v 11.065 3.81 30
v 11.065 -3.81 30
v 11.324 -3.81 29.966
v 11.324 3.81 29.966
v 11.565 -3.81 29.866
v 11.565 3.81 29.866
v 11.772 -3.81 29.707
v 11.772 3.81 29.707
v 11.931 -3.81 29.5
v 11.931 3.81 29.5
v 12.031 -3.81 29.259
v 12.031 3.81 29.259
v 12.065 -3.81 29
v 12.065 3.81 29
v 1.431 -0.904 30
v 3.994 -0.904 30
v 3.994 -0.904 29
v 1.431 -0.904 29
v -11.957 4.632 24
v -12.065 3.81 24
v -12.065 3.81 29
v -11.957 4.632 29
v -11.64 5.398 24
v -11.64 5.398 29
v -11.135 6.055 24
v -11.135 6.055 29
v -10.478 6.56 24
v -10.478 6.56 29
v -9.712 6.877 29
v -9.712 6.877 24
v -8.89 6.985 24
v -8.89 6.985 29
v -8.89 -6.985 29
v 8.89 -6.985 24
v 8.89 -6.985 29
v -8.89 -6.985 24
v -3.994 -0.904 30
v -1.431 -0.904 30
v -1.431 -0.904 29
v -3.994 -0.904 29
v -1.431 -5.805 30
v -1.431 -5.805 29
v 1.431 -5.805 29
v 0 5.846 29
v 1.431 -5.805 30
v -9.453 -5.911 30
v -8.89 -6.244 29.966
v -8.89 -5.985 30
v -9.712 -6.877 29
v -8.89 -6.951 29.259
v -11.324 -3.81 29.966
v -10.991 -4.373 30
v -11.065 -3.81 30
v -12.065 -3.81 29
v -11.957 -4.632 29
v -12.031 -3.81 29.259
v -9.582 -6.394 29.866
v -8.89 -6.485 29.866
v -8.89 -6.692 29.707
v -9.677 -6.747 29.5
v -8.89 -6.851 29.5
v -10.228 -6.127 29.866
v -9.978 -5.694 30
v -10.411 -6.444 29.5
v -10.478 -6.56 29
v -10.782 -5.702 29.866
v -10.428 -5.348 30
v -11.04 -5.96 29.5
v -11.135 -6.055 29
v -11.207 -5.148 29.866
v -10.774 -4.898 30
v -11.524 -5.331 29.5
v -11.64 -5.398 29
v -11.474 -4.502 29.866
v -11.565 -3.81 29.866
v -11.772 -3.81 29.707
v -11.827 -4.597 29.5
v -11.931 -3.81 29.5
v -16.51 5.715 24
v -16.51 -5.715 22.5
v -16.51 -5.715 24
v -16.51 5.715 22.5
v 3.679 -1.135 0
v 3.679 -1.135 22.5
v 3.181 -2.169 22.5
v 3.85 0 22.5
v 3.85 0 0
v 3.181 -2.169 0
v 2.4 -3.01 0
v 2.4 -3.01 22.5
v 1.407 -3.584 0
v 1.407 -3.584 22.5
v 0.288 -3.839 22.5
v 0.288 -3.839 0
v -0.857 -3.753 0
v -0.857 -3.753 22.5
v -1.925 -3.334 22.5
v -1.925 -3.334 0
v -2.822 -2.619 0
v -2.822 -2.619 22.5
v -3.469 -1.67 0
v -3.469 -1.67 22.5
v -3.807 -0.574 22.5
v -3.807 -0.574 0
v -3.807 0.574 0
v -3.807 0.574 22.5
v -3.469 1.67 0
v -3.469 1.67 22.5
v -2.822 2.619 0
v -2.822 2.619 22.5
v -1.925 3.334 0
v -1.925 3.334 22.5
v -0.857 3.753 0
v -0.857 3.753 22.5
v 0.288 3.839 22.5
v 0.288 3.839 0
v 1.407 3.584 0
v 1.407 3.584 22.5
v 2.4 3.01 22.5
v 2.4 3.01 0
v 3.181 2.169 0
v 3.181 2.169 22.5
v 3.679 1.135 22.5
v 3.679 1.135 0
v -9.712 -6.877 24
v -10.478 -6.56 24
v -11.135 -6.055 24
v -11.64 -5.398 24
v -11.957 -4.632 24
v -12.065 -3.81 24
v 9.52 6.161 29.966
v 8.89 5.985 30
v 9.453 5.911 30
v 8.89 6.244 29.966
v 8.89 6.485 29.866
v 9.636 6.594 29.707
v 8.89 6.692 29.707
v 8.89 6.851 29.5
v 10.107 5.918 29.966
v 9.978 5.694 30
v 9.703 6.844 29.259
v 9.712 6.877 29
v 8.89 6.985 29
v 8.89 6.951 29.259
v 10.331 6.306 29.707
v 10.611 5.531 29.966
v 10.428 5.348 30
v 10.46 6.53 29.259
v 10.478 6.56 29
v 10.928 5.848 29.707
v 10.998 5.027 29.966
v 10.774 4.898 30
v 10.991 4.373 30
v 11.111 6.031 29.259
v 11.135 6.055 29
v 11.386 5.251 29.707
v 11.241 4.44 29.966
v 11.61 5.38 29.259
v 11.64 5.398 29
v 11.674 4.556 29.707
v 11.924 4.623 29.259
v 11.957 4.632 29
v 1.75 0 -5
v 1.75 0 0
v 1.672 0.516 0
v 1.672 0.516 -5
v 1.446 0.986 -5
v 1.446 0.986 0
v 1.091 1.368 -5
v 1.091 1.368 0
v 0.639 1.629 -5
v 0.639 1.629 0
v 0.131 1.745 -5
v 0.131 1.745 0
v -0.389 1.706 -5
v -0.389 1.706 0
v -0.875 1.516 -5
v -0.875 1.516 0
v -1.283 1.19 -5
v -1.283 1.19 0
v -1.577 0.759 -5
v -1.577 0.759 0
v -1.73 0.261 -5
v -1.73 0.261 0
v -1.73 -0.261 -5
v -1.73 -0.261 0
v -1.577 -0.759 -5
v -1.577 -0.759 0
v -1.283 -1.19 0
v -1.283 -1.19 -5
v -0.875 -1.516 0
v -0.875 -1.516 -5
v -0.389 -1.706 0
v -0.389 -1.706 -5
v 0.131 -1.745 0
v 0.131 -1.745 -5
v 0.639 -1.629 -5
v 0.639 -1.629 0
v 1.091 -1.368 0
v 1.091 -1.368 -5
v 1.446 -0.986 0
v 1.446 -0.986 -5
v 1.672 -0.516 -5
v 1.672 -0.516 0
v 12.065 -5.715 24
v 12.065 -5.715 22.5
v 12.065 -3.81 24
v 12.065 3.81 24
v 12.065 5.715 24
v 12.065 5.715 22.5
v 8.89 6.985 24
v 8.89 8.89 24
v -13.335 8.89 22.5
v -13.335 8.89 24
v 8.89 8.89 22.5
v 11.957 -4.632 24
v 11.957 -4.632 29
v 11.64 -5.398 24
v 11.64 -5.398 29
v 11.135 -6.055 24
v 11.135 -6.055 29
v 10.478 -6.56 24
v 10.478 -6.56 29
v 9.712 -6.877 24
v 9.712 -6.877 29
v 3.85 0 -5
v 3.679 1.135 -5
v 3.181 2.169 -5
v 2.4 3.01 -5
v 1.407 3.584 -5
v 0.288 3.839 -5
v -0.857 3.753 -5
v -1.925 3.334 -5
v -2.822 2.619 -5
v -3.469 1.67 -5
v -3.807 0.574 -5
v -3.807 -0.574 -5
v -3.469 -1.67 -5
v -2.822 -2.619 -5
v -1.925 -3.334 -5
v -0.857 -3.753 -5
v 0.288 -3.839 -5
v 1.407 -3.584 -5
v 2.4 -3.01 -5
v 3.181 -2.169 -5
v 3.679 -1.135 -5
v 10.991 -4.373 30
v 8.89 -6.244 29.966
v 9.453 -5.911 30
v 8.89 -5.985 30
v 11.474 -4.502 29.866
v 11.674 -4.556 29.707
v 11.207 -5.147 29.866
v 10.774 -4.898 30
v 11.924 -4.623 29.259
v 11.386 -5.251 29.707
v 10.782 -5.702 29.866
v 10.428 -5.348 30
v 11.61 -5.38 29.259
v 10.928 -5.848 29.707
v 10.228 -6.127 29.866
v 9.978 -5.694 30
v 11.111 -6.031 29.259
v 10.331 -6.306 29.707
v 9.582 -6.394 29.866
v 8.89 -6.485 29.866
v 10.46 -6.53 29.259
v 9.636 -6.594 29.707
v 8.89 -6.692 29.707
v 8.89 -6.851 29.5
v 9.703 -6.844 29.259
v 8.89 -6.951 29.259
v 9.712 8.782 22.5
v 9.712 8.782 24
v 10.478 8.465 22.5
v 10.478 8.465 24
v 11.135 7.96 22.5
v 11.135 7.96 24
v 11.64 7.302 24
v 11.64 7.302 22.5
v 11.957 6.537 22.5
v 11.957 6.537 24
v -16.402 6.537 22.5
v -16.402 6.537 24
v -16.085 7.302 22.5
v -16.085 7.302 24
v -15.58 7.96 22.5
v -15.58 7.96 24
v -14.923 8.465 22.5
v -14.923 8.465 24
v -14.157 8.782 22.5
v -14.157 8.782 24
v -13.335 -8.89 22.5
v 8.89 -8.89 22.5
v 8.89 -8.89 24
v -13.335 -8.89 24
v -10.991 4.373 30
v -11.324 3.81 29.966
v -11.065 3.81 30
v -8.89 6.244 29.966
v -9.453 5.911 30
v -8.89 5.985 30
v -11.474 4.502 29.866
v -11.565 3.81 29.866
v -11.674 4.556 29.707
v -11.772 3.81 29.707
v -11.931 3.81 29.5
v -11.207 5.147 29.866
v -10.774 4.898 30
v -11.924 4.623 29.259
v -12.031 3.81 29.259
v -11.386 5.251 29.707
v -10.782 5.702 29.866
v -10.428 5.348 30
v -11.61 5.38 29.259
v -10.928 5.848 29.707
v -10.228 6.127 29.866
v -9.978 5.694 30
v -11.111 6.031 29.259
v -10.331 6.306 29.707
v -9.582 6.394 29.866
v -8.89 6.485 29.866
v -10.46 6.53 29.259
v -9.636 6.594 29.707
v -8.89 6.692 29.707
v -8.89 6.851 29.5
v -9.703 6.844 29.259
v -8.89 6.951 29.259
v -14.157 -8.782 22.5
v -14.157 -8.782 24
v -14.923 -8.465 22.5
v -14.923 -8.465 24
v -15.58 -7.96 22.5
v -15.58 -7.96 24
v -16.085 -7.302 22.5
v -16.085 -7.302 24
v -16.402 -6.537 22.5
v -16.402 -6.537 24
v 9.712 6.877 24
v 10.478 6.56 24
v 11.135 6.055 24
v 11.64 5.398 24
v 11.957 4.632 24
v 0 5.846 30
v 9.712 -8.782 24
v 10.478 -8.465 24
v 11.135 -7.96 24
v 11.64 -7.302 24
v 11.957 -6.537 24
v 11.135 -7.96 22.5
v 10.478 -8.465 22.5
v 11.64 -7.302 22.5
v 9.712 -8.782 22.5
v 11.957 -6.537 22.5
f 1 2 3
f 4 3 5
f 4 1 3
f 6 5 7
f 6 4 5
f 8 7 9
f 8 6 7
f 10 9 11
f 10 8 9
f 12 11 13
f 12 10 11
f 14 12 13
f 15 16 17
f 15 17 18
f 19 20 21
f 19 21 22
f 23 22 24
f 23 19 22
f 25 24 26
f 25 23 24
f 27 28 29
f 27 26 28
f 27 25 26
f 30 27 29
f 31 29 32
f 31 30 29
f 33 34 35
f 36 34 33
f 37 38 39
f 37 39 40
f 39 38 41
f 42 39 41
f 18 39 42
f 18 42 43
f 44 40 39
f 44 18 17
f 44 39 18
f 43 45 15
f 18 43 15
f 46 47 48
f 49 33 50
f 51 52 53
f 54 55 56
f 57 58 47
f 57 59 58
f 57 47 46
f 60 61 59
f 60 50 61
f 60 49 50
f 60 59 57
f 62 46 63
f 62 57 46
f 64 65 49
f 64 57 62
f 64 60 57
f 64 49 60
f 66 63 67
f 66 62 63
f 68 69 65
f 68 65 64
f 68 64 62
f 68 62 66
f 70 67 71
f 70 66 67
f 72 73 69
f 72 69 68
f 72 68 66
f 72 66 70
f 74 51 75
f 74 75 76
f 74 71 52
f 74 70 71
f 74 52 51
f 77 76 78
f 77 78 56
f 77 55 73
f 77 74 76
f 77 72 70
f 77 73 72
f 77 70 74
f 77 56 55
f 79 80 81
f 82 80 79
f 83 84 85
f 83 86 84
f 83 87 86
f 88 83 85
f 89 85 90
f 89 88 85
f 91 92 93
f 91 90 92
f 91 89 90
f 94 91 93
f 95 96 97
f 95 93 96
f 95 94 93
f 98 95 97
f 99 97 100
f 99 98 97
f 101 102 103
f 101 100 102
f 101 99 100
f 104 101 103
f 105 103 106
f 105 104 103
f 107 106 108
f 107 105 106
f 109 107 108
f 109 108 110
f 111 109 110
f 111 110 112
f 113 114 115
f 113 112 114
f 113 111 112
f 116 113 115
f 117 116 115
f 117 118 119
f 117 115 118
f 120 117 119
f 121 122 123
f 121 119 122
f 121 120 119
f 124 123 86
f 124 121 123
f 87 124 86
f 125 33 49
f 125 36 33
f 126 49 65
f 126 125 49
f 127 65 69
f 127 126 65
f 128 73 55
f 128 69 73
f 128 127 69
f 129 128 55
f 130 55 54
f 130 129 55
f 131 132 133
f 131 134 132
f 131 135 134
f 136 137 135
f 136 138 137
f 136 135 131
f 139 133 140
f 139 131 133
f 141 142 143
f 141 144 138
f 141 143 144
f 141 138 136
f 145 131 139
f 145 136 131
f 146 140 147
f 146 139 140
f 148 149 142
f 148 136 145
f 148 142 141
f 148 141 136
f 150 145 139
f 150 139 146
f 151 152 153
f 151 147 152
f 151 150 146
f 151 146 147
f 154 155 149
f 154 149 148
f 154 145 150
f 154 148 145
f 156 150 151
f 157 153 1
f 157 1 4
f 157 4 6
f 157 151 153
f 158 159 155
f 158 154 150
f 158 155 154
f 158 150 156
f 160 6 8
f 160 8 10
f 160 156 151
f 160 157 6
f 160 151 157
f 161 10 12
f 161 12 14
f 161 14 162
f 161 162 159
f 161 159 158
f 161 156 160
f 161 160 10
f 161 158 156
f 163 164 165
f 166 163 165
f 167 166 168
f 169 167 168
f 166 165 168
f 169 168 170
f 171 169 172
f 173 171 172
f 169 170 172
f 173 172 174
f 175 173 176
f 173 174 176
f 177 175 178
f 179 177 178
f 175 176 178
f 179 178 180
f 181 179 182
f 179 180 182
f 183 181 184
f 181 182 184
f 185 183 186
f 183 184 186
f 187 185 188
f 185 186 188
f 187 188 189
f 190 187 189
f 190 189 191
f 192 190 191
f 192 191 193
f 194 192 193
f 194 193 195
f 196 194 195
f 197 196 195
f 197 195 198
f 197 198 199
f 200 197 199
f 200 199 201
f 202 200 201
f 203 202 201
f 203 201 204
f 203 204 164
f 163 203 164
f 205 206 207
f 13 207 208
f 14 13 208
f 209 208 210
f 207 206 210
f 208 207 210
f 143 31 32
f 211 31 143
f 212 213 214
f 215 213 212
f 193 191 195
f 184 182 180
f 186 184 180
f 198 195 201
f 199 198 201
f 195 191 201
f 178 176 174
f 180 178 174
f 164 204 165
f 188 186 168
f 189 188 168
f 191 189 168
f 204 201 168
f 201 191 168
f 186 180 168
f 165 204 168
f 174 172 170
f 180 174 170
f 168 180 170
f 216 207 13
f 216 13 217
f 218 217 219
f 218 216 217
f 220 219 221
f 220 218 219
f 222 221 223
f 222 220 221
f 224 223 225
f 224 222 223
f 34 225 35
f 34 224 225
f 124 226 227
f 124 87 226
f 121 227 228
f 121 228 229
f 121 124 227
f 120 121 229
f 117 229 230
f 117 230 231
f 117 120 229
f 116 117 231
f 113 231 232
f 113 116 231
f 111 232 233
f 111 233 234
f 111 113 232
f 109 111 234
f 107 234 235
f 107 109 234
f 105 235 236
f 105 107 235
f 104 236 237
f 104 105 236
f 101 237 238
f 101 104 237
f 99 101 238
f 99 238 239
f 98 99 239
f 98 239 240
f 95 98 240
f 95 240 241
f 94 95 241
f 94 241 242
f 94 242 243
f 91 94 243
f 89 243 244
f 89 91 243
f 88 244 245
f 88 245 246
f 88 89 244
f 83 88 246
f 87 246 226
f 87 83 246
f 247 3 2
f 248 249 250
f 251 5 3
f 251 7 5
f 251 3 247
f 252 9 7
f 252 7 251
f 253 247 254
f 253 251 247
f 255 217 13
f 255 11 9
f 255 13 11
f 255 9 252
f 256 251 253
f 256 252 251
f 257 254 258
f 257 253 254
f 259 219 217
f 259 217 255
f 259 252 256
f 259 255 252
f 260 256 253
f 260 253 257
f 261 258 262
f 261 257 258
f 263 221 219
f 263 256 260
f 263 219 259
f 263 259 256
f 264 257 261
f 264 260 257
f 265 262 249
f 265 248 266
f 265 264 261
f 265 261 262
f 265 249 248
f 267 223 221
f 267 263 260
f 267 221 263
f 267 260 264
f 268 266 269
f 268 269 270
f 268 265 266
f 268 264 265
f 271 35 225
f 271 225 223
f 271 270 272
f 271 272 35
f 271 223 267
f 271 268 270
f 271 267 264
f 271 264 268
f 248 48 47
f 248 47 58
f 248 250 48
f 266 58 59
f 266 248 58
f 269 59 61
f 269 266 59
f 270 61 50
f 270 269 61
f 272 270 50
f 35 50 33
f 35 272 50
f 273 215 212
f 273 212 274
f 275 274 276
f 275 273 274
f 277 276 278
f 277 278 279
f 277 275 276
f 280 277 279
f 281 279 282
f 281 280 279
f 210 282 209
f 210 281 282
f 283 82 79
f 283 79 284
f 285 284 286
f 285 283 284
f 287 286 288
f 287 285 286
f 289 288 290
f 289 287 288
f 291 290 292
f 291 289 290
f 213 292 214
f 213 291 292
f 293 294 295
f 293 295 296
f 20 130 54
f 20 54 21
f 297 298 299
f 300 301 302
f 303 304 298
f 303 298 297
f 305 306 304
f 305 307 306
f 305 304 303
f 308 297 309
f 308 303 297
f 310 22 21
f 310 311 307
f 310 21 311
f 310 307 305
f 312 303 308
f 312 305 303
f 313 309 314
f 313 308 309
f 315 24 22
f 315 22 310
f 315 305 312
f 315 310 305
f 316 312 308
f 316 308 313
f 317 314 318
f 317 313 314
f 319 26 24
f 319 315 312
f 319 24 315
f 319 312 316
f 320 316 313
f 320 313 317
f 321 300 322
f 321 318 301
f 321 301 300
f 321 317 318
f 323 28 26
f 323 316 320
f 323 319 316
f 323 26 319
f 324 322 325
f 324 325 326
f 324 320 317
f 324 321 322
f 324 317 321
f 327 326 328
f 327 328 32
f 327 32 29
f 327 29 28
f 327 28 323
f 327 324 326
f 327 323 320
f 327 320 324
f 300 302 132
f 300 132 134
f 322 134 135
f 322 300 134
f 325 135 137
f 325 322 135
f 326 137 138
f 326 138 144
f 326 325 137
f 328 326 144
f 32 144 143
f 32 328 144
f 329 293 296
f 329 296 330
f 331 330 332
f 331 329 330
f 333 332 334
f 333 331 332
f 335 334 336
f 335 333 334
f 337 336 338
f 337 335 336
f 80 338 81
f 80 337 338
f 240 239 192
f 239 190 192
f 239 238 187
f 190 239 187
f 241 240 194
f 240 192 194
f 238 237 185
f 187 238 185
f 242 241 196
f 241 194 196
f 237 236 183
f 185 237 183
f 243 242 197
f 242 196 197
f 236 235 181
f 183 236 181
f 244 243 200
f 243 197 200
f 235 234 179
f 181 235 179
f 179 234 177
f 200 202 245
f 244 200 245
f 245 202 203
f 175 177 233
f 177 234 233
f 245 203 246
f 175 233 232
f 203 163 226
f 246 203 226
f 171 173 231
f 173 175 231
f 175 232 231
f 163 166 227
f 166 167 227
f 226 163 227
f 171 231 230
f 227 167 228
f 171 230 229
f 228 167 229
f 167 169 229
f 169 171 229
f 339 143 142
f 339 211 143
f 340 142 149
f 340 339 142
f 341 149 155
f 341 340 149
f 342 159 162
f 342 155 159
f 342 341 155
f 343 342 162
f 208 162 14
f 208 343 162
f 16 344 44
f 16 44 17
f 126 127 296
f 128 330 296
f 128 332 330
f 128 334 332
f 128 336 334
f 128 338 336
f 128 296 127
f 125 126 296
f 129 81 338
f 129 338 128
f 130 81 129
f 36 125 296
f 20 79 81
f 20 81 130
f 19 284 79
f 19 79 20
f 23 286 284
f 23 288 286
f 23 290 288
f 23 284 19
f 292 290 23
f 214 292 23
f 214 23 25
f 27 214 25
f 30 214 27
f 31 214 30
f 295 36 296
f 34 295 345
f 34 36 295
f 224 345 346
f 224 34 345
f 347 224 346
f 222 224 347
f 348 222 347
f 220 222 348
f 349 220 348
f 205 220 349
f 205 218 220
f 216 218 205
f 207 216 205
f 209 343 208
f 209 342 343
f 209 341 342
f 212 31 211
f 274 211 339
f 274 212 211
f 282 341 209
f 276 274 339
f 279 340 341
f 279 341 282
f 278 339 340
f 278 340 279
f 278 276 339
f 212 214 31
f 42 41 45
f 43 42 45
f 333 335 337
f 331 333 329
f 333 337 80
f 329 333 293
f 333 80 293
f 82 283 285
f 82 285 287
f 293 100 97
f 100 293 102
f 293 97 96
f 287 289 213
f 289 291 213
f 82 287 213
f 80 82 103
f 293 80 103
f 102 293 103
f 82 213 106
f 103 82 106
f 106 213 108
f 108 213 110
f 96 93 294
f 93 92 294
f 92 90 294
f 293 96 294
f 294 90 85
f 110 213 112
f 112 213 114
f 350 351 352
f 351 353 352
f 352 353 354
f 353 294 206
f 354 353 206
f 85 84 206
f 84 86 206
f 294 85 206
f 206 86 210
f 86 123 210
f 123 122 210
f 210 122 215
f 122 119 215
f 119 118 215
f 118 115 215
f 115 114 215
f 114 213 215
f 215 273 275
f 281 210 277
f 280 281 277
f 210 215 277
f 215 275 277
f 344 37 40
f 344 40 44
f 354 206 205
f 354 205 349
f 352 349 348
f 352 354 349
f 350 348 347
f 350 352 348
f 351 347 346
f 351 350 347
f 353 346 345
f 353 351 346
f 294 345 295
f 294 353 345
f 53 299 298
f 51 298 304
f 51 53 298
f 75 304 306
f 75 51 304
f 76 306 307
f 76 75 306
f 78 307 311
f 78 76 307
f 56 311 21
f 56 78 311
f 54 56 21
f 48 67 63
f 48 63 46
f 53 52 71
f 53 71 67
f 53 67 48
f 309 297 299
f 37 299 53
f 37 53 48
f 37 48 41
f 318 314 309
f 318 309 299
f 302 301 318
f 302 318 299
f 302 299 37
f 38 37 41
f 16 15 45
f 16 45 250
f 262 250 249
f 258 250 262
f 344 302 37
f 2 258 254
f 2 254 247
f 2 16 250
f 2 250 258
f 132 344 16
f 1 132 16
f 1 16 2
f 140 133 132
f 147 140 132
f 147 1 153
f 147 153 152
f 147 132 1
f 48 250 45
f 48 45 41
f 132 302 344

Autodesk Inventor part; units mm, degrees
ref_plane "YZ Plane" through (0, 0, 0) normal (1, 0, 0) x (0, 1, 0)
ref_plane "XZ Plane" through (0, 0, 0) normal (0, 1, 0) x (-1, 0, 0)
ref_plane "XY Plane" through (0, 0, 0) normal (0, 0, 1) x (1, 0, 0)
sketch "Sketch1" plane through (0, 0, 0) normal (0, 0, 1) x (1, 0, 0)
  circle A0 centre (0, 0) radius 1.75 projected
  circle A1 centre (0, 0) radius 1.85
  circle A2 centre (0, 0) radius 3.85
  point P0 (0, 0)
  dimension "d0" = 0.1
  dimension "d1" = 2
extrude "Extrusion1" add sketch "Sketch1" against normal blind 5 contours A1 | A2
sketch "Sketch2" plane through (0, 0, 0) normal (0, 0, 1) x (1, 0, 0)
  point P0 (0, 0)
sketch "Sketch3" plane through (0, 0, 0) normal (0, 0, 1) x (1, 0, 0)
  circle A0 centre (0, 0) radius 3.85
extrude "Extrusion2" add sketch "Sketch3" along normal blind 22.5
sketch "Sketch4" plane through (0, 0, 22.5) normal (0, 0, 1) x (1, 0, 0)
  line L0 (12.065, -6.985) -> (-12.065, -6.985)
  line L1 (-12.065, -6.985) -> (-12.065, 6.985)
  line L2 (-12.065, 6.985) -> (12.065, 6.985)
  line L3 (12.065, 6.985) -> (12.065, -6.985)
  circle A0 centre (0, 0) radius 1.85 projected
  line L4 (12.065, -6.985) -> (-12.065, 6.985) construction
  line L5 (-12.065, -6.985) -> (12.065, 6.985) construction
  line L6 (12.065, 12.065) -> (-12.065, 12.065) construction
  line L7 (-12.065, 12.065) -> (-12.065, 26.035) construction
  line L8 (-12.065, 26.035) -> (12.065, 26.035) construction
  line L9 (12.065, 26.035) -> (12.065, 12.065) construction
  line L10 (12.065, 12.065) -> (-12.065, 26.035) construction
  line L11 (-12.065, 12.065) -> (12.065, 26.035) construction
  line L12 (12.065, -8.89) -> (-16.51, -8.89)
  line L13 (-16.51, -8.89) -> (-16.51, 8.89)
  line L14 (-16.51, 8.89) -> (12.065, 8.89)
  line L15 (16.51, -8.89) -> (-16.51, 8.89) construction
  line L16 (-16.51, -8.89) -> (12.065, 6.4965) construction
  line L17 (12.065, -8.89) -> (12.065, 8.89)
  point P0 (0, 0)
  point P1 (0, 19.05)
  dimension "d6" = 24.13
  dimension "d7" = 13.97
  dimension "d10" = 19.05
  dimension "d16" = 17.78
extrude "Extrusion3" add sketch "Sketch4" along normal blind 1.5 contours L17 L12 L13 L14 L2 L1 L0 | L0 L1 L2 L3 | A0
extrude "Extrusion4" add sketch "Sketch4" along normal blind 7.5 contours L0 L1 L2 L3 | A0
fillet "Fillet1" radius 3.175 8 edges at (-12.065, 6.985, 27) (12.065, 6.985, 27) (12.065, -6.985, 27) (-12.065, -6.985, 27) (-16.51, -8.89, 23.25) (12.065, 8.89, 23.25) (-16.51, 8.89, 23.25) (12.065, -8.89, 23.25)
sketch "Sketch5" plane through (0, 0, 30) normal (0, 0, 1) x (1, 0, 0)
  line L0 (0, 5.8462) -> (-3.9945, -0.9035)
  line L1 (3.9945, -0.9035) -> (0, 5.8462)
  line L2 (1.4311, -0.9035) -> (1.4311, -5.8047)
  line L3 (1.4311, -5.8047) -> (-1.4311, -5.8047)
  line L4 (-1.4311, -5.8047) -> (-1.4311, -0.9035)
  line L5 (8.89, 6.985) -> (-8.89, 6.985)
  arc A0 (8.89, -6.985) -> (12.065, -3.81) centre (8.89, -3.81) ccw
  line L6 (-8.89, -6.985) -> (8.89, -6.985)
  arc A1 (-12.065, -3.81) -> (-8.89, -6.985) centre (-8.89, -3.81) ccw
  arc A2 (-8.89, 6.985) -> (-12.065, 3.81) centre (-8.89, 3.81) ccw
  line L7 (-12.065, 3.81) -> (-12.065, -3.81)
  arc A3 (12.065, 3.81) -> (8.89, 6.985) centre (8.89, 3.81) ccw
  line L8 (12.065, -3.81) -> (12.065, 3.81)
  line L9 (-3.9945, -0.9035) -> (-1.4311, -0.9035)
  line L10 (1.4311, -0.9035) -> (3.9945, -0.9035)
  point P0 (0, 0)
  point P1 (0, 0)
  point P2 (0, -0.9035)
  point P3 (0, 6.985)
emboss "Emboss1" sketch "Sketch5" operation cut depth 1 direction (0, 0, -1) contours L1 L10 L2 L3 L4 L9 L0
fillet "Fillet2" radius 1 8 edges at (-11.1351, 6.0551, 30) (-12.065, 0, 30) (-11.1351, -6.0551, 30) (0, -6.985, 30) (11.1351, -6.0551, 30) (12.065, 0, 30) (11.1351, 6.0551, 30) (0, 6.985, 30)
properties part number "Button Cover"
